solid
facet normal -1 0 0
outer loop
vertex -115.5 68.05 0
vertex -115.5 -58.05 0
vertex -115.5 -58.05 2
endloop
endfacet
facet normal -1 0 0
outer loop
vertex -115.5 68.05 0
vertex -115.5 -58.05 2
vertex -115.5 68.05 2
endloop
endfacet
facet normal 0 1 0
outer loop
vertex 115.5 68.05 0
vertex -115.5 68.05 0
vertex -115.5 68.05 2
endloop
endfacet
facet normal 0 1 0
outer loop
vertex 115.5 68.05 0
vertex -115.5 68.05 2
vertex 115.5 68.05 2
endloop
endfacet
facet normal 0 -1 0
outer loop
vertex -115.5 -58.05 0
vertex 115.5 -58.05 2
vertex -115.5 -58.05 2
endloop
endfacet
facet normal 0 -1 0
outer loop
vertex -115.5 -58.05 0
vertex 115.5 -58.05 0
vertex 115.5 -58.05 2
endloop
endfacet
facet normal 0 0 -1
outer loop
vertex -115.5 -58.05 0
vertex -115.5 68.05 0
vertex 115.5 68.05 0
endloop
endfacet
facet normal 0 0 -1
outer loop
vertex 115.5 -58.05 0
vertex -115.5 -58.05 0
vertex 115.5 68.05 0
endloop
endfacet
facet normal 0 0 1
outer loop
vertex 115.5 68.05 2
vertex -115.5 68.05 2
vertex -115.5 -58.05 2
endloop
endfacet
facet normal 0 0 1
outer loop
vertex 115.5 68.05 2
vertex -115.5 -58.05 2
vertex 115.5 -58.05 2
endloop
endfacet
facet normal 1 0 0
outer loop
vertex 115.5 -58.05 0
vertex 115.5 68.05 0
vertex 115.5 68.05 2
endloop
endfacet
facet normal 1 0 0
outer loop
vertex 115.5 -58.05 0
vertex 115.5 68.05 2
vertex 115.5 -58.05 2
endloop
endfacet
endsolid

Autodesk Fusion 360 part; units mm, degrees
sketch "Sketch1" plane through (0, 0, 0) normal (0, 0, 1) x (1, 0, 0)
  line L0 (115.5, -68.05) -> (-115.5, -68.05)
  line L1 (-115.5, -68.05) -> (-115.5, 68.05)
  line L2 (-115.5, 68.05) -> (115.5, 68.05)
  line L3 (115.5, 68.05) -> (115.5, -68.05)
  line L4 (115.5, -68.05) -> (-115.5, 68.05) construction
  line L5 (-115.5, -68.05) -> (115.5, 68.05) construction
  dimension "d1" = 136.1
  dimension "d2" = 231
extrude "Extrude1" add sketch "Sketch1" along normal blind 2
sketch "Sketch3" plane through (0, 0, 2) normal (0, 0, 1) x (-1, 0, 0)
  line L0 (-115.5, -68.05) -> (115.5, -68.05)
  line L1 (115.5, -68.05) -> (115.5, 68.05)
  line L2 (115.5, 68.05) -> (-115.5, 68.05)
  line L3 (-115.5, 68.05) -> (-115.5, -68.05)
move_face "OffsetFaces1" offset -5 1 faces at (38.5, -68.05, 0.6667)
extrude "Extrude2" cut 1 faces at (38.5, -63.05, 0.6667) along direction (0, 1, 0) blind 5
